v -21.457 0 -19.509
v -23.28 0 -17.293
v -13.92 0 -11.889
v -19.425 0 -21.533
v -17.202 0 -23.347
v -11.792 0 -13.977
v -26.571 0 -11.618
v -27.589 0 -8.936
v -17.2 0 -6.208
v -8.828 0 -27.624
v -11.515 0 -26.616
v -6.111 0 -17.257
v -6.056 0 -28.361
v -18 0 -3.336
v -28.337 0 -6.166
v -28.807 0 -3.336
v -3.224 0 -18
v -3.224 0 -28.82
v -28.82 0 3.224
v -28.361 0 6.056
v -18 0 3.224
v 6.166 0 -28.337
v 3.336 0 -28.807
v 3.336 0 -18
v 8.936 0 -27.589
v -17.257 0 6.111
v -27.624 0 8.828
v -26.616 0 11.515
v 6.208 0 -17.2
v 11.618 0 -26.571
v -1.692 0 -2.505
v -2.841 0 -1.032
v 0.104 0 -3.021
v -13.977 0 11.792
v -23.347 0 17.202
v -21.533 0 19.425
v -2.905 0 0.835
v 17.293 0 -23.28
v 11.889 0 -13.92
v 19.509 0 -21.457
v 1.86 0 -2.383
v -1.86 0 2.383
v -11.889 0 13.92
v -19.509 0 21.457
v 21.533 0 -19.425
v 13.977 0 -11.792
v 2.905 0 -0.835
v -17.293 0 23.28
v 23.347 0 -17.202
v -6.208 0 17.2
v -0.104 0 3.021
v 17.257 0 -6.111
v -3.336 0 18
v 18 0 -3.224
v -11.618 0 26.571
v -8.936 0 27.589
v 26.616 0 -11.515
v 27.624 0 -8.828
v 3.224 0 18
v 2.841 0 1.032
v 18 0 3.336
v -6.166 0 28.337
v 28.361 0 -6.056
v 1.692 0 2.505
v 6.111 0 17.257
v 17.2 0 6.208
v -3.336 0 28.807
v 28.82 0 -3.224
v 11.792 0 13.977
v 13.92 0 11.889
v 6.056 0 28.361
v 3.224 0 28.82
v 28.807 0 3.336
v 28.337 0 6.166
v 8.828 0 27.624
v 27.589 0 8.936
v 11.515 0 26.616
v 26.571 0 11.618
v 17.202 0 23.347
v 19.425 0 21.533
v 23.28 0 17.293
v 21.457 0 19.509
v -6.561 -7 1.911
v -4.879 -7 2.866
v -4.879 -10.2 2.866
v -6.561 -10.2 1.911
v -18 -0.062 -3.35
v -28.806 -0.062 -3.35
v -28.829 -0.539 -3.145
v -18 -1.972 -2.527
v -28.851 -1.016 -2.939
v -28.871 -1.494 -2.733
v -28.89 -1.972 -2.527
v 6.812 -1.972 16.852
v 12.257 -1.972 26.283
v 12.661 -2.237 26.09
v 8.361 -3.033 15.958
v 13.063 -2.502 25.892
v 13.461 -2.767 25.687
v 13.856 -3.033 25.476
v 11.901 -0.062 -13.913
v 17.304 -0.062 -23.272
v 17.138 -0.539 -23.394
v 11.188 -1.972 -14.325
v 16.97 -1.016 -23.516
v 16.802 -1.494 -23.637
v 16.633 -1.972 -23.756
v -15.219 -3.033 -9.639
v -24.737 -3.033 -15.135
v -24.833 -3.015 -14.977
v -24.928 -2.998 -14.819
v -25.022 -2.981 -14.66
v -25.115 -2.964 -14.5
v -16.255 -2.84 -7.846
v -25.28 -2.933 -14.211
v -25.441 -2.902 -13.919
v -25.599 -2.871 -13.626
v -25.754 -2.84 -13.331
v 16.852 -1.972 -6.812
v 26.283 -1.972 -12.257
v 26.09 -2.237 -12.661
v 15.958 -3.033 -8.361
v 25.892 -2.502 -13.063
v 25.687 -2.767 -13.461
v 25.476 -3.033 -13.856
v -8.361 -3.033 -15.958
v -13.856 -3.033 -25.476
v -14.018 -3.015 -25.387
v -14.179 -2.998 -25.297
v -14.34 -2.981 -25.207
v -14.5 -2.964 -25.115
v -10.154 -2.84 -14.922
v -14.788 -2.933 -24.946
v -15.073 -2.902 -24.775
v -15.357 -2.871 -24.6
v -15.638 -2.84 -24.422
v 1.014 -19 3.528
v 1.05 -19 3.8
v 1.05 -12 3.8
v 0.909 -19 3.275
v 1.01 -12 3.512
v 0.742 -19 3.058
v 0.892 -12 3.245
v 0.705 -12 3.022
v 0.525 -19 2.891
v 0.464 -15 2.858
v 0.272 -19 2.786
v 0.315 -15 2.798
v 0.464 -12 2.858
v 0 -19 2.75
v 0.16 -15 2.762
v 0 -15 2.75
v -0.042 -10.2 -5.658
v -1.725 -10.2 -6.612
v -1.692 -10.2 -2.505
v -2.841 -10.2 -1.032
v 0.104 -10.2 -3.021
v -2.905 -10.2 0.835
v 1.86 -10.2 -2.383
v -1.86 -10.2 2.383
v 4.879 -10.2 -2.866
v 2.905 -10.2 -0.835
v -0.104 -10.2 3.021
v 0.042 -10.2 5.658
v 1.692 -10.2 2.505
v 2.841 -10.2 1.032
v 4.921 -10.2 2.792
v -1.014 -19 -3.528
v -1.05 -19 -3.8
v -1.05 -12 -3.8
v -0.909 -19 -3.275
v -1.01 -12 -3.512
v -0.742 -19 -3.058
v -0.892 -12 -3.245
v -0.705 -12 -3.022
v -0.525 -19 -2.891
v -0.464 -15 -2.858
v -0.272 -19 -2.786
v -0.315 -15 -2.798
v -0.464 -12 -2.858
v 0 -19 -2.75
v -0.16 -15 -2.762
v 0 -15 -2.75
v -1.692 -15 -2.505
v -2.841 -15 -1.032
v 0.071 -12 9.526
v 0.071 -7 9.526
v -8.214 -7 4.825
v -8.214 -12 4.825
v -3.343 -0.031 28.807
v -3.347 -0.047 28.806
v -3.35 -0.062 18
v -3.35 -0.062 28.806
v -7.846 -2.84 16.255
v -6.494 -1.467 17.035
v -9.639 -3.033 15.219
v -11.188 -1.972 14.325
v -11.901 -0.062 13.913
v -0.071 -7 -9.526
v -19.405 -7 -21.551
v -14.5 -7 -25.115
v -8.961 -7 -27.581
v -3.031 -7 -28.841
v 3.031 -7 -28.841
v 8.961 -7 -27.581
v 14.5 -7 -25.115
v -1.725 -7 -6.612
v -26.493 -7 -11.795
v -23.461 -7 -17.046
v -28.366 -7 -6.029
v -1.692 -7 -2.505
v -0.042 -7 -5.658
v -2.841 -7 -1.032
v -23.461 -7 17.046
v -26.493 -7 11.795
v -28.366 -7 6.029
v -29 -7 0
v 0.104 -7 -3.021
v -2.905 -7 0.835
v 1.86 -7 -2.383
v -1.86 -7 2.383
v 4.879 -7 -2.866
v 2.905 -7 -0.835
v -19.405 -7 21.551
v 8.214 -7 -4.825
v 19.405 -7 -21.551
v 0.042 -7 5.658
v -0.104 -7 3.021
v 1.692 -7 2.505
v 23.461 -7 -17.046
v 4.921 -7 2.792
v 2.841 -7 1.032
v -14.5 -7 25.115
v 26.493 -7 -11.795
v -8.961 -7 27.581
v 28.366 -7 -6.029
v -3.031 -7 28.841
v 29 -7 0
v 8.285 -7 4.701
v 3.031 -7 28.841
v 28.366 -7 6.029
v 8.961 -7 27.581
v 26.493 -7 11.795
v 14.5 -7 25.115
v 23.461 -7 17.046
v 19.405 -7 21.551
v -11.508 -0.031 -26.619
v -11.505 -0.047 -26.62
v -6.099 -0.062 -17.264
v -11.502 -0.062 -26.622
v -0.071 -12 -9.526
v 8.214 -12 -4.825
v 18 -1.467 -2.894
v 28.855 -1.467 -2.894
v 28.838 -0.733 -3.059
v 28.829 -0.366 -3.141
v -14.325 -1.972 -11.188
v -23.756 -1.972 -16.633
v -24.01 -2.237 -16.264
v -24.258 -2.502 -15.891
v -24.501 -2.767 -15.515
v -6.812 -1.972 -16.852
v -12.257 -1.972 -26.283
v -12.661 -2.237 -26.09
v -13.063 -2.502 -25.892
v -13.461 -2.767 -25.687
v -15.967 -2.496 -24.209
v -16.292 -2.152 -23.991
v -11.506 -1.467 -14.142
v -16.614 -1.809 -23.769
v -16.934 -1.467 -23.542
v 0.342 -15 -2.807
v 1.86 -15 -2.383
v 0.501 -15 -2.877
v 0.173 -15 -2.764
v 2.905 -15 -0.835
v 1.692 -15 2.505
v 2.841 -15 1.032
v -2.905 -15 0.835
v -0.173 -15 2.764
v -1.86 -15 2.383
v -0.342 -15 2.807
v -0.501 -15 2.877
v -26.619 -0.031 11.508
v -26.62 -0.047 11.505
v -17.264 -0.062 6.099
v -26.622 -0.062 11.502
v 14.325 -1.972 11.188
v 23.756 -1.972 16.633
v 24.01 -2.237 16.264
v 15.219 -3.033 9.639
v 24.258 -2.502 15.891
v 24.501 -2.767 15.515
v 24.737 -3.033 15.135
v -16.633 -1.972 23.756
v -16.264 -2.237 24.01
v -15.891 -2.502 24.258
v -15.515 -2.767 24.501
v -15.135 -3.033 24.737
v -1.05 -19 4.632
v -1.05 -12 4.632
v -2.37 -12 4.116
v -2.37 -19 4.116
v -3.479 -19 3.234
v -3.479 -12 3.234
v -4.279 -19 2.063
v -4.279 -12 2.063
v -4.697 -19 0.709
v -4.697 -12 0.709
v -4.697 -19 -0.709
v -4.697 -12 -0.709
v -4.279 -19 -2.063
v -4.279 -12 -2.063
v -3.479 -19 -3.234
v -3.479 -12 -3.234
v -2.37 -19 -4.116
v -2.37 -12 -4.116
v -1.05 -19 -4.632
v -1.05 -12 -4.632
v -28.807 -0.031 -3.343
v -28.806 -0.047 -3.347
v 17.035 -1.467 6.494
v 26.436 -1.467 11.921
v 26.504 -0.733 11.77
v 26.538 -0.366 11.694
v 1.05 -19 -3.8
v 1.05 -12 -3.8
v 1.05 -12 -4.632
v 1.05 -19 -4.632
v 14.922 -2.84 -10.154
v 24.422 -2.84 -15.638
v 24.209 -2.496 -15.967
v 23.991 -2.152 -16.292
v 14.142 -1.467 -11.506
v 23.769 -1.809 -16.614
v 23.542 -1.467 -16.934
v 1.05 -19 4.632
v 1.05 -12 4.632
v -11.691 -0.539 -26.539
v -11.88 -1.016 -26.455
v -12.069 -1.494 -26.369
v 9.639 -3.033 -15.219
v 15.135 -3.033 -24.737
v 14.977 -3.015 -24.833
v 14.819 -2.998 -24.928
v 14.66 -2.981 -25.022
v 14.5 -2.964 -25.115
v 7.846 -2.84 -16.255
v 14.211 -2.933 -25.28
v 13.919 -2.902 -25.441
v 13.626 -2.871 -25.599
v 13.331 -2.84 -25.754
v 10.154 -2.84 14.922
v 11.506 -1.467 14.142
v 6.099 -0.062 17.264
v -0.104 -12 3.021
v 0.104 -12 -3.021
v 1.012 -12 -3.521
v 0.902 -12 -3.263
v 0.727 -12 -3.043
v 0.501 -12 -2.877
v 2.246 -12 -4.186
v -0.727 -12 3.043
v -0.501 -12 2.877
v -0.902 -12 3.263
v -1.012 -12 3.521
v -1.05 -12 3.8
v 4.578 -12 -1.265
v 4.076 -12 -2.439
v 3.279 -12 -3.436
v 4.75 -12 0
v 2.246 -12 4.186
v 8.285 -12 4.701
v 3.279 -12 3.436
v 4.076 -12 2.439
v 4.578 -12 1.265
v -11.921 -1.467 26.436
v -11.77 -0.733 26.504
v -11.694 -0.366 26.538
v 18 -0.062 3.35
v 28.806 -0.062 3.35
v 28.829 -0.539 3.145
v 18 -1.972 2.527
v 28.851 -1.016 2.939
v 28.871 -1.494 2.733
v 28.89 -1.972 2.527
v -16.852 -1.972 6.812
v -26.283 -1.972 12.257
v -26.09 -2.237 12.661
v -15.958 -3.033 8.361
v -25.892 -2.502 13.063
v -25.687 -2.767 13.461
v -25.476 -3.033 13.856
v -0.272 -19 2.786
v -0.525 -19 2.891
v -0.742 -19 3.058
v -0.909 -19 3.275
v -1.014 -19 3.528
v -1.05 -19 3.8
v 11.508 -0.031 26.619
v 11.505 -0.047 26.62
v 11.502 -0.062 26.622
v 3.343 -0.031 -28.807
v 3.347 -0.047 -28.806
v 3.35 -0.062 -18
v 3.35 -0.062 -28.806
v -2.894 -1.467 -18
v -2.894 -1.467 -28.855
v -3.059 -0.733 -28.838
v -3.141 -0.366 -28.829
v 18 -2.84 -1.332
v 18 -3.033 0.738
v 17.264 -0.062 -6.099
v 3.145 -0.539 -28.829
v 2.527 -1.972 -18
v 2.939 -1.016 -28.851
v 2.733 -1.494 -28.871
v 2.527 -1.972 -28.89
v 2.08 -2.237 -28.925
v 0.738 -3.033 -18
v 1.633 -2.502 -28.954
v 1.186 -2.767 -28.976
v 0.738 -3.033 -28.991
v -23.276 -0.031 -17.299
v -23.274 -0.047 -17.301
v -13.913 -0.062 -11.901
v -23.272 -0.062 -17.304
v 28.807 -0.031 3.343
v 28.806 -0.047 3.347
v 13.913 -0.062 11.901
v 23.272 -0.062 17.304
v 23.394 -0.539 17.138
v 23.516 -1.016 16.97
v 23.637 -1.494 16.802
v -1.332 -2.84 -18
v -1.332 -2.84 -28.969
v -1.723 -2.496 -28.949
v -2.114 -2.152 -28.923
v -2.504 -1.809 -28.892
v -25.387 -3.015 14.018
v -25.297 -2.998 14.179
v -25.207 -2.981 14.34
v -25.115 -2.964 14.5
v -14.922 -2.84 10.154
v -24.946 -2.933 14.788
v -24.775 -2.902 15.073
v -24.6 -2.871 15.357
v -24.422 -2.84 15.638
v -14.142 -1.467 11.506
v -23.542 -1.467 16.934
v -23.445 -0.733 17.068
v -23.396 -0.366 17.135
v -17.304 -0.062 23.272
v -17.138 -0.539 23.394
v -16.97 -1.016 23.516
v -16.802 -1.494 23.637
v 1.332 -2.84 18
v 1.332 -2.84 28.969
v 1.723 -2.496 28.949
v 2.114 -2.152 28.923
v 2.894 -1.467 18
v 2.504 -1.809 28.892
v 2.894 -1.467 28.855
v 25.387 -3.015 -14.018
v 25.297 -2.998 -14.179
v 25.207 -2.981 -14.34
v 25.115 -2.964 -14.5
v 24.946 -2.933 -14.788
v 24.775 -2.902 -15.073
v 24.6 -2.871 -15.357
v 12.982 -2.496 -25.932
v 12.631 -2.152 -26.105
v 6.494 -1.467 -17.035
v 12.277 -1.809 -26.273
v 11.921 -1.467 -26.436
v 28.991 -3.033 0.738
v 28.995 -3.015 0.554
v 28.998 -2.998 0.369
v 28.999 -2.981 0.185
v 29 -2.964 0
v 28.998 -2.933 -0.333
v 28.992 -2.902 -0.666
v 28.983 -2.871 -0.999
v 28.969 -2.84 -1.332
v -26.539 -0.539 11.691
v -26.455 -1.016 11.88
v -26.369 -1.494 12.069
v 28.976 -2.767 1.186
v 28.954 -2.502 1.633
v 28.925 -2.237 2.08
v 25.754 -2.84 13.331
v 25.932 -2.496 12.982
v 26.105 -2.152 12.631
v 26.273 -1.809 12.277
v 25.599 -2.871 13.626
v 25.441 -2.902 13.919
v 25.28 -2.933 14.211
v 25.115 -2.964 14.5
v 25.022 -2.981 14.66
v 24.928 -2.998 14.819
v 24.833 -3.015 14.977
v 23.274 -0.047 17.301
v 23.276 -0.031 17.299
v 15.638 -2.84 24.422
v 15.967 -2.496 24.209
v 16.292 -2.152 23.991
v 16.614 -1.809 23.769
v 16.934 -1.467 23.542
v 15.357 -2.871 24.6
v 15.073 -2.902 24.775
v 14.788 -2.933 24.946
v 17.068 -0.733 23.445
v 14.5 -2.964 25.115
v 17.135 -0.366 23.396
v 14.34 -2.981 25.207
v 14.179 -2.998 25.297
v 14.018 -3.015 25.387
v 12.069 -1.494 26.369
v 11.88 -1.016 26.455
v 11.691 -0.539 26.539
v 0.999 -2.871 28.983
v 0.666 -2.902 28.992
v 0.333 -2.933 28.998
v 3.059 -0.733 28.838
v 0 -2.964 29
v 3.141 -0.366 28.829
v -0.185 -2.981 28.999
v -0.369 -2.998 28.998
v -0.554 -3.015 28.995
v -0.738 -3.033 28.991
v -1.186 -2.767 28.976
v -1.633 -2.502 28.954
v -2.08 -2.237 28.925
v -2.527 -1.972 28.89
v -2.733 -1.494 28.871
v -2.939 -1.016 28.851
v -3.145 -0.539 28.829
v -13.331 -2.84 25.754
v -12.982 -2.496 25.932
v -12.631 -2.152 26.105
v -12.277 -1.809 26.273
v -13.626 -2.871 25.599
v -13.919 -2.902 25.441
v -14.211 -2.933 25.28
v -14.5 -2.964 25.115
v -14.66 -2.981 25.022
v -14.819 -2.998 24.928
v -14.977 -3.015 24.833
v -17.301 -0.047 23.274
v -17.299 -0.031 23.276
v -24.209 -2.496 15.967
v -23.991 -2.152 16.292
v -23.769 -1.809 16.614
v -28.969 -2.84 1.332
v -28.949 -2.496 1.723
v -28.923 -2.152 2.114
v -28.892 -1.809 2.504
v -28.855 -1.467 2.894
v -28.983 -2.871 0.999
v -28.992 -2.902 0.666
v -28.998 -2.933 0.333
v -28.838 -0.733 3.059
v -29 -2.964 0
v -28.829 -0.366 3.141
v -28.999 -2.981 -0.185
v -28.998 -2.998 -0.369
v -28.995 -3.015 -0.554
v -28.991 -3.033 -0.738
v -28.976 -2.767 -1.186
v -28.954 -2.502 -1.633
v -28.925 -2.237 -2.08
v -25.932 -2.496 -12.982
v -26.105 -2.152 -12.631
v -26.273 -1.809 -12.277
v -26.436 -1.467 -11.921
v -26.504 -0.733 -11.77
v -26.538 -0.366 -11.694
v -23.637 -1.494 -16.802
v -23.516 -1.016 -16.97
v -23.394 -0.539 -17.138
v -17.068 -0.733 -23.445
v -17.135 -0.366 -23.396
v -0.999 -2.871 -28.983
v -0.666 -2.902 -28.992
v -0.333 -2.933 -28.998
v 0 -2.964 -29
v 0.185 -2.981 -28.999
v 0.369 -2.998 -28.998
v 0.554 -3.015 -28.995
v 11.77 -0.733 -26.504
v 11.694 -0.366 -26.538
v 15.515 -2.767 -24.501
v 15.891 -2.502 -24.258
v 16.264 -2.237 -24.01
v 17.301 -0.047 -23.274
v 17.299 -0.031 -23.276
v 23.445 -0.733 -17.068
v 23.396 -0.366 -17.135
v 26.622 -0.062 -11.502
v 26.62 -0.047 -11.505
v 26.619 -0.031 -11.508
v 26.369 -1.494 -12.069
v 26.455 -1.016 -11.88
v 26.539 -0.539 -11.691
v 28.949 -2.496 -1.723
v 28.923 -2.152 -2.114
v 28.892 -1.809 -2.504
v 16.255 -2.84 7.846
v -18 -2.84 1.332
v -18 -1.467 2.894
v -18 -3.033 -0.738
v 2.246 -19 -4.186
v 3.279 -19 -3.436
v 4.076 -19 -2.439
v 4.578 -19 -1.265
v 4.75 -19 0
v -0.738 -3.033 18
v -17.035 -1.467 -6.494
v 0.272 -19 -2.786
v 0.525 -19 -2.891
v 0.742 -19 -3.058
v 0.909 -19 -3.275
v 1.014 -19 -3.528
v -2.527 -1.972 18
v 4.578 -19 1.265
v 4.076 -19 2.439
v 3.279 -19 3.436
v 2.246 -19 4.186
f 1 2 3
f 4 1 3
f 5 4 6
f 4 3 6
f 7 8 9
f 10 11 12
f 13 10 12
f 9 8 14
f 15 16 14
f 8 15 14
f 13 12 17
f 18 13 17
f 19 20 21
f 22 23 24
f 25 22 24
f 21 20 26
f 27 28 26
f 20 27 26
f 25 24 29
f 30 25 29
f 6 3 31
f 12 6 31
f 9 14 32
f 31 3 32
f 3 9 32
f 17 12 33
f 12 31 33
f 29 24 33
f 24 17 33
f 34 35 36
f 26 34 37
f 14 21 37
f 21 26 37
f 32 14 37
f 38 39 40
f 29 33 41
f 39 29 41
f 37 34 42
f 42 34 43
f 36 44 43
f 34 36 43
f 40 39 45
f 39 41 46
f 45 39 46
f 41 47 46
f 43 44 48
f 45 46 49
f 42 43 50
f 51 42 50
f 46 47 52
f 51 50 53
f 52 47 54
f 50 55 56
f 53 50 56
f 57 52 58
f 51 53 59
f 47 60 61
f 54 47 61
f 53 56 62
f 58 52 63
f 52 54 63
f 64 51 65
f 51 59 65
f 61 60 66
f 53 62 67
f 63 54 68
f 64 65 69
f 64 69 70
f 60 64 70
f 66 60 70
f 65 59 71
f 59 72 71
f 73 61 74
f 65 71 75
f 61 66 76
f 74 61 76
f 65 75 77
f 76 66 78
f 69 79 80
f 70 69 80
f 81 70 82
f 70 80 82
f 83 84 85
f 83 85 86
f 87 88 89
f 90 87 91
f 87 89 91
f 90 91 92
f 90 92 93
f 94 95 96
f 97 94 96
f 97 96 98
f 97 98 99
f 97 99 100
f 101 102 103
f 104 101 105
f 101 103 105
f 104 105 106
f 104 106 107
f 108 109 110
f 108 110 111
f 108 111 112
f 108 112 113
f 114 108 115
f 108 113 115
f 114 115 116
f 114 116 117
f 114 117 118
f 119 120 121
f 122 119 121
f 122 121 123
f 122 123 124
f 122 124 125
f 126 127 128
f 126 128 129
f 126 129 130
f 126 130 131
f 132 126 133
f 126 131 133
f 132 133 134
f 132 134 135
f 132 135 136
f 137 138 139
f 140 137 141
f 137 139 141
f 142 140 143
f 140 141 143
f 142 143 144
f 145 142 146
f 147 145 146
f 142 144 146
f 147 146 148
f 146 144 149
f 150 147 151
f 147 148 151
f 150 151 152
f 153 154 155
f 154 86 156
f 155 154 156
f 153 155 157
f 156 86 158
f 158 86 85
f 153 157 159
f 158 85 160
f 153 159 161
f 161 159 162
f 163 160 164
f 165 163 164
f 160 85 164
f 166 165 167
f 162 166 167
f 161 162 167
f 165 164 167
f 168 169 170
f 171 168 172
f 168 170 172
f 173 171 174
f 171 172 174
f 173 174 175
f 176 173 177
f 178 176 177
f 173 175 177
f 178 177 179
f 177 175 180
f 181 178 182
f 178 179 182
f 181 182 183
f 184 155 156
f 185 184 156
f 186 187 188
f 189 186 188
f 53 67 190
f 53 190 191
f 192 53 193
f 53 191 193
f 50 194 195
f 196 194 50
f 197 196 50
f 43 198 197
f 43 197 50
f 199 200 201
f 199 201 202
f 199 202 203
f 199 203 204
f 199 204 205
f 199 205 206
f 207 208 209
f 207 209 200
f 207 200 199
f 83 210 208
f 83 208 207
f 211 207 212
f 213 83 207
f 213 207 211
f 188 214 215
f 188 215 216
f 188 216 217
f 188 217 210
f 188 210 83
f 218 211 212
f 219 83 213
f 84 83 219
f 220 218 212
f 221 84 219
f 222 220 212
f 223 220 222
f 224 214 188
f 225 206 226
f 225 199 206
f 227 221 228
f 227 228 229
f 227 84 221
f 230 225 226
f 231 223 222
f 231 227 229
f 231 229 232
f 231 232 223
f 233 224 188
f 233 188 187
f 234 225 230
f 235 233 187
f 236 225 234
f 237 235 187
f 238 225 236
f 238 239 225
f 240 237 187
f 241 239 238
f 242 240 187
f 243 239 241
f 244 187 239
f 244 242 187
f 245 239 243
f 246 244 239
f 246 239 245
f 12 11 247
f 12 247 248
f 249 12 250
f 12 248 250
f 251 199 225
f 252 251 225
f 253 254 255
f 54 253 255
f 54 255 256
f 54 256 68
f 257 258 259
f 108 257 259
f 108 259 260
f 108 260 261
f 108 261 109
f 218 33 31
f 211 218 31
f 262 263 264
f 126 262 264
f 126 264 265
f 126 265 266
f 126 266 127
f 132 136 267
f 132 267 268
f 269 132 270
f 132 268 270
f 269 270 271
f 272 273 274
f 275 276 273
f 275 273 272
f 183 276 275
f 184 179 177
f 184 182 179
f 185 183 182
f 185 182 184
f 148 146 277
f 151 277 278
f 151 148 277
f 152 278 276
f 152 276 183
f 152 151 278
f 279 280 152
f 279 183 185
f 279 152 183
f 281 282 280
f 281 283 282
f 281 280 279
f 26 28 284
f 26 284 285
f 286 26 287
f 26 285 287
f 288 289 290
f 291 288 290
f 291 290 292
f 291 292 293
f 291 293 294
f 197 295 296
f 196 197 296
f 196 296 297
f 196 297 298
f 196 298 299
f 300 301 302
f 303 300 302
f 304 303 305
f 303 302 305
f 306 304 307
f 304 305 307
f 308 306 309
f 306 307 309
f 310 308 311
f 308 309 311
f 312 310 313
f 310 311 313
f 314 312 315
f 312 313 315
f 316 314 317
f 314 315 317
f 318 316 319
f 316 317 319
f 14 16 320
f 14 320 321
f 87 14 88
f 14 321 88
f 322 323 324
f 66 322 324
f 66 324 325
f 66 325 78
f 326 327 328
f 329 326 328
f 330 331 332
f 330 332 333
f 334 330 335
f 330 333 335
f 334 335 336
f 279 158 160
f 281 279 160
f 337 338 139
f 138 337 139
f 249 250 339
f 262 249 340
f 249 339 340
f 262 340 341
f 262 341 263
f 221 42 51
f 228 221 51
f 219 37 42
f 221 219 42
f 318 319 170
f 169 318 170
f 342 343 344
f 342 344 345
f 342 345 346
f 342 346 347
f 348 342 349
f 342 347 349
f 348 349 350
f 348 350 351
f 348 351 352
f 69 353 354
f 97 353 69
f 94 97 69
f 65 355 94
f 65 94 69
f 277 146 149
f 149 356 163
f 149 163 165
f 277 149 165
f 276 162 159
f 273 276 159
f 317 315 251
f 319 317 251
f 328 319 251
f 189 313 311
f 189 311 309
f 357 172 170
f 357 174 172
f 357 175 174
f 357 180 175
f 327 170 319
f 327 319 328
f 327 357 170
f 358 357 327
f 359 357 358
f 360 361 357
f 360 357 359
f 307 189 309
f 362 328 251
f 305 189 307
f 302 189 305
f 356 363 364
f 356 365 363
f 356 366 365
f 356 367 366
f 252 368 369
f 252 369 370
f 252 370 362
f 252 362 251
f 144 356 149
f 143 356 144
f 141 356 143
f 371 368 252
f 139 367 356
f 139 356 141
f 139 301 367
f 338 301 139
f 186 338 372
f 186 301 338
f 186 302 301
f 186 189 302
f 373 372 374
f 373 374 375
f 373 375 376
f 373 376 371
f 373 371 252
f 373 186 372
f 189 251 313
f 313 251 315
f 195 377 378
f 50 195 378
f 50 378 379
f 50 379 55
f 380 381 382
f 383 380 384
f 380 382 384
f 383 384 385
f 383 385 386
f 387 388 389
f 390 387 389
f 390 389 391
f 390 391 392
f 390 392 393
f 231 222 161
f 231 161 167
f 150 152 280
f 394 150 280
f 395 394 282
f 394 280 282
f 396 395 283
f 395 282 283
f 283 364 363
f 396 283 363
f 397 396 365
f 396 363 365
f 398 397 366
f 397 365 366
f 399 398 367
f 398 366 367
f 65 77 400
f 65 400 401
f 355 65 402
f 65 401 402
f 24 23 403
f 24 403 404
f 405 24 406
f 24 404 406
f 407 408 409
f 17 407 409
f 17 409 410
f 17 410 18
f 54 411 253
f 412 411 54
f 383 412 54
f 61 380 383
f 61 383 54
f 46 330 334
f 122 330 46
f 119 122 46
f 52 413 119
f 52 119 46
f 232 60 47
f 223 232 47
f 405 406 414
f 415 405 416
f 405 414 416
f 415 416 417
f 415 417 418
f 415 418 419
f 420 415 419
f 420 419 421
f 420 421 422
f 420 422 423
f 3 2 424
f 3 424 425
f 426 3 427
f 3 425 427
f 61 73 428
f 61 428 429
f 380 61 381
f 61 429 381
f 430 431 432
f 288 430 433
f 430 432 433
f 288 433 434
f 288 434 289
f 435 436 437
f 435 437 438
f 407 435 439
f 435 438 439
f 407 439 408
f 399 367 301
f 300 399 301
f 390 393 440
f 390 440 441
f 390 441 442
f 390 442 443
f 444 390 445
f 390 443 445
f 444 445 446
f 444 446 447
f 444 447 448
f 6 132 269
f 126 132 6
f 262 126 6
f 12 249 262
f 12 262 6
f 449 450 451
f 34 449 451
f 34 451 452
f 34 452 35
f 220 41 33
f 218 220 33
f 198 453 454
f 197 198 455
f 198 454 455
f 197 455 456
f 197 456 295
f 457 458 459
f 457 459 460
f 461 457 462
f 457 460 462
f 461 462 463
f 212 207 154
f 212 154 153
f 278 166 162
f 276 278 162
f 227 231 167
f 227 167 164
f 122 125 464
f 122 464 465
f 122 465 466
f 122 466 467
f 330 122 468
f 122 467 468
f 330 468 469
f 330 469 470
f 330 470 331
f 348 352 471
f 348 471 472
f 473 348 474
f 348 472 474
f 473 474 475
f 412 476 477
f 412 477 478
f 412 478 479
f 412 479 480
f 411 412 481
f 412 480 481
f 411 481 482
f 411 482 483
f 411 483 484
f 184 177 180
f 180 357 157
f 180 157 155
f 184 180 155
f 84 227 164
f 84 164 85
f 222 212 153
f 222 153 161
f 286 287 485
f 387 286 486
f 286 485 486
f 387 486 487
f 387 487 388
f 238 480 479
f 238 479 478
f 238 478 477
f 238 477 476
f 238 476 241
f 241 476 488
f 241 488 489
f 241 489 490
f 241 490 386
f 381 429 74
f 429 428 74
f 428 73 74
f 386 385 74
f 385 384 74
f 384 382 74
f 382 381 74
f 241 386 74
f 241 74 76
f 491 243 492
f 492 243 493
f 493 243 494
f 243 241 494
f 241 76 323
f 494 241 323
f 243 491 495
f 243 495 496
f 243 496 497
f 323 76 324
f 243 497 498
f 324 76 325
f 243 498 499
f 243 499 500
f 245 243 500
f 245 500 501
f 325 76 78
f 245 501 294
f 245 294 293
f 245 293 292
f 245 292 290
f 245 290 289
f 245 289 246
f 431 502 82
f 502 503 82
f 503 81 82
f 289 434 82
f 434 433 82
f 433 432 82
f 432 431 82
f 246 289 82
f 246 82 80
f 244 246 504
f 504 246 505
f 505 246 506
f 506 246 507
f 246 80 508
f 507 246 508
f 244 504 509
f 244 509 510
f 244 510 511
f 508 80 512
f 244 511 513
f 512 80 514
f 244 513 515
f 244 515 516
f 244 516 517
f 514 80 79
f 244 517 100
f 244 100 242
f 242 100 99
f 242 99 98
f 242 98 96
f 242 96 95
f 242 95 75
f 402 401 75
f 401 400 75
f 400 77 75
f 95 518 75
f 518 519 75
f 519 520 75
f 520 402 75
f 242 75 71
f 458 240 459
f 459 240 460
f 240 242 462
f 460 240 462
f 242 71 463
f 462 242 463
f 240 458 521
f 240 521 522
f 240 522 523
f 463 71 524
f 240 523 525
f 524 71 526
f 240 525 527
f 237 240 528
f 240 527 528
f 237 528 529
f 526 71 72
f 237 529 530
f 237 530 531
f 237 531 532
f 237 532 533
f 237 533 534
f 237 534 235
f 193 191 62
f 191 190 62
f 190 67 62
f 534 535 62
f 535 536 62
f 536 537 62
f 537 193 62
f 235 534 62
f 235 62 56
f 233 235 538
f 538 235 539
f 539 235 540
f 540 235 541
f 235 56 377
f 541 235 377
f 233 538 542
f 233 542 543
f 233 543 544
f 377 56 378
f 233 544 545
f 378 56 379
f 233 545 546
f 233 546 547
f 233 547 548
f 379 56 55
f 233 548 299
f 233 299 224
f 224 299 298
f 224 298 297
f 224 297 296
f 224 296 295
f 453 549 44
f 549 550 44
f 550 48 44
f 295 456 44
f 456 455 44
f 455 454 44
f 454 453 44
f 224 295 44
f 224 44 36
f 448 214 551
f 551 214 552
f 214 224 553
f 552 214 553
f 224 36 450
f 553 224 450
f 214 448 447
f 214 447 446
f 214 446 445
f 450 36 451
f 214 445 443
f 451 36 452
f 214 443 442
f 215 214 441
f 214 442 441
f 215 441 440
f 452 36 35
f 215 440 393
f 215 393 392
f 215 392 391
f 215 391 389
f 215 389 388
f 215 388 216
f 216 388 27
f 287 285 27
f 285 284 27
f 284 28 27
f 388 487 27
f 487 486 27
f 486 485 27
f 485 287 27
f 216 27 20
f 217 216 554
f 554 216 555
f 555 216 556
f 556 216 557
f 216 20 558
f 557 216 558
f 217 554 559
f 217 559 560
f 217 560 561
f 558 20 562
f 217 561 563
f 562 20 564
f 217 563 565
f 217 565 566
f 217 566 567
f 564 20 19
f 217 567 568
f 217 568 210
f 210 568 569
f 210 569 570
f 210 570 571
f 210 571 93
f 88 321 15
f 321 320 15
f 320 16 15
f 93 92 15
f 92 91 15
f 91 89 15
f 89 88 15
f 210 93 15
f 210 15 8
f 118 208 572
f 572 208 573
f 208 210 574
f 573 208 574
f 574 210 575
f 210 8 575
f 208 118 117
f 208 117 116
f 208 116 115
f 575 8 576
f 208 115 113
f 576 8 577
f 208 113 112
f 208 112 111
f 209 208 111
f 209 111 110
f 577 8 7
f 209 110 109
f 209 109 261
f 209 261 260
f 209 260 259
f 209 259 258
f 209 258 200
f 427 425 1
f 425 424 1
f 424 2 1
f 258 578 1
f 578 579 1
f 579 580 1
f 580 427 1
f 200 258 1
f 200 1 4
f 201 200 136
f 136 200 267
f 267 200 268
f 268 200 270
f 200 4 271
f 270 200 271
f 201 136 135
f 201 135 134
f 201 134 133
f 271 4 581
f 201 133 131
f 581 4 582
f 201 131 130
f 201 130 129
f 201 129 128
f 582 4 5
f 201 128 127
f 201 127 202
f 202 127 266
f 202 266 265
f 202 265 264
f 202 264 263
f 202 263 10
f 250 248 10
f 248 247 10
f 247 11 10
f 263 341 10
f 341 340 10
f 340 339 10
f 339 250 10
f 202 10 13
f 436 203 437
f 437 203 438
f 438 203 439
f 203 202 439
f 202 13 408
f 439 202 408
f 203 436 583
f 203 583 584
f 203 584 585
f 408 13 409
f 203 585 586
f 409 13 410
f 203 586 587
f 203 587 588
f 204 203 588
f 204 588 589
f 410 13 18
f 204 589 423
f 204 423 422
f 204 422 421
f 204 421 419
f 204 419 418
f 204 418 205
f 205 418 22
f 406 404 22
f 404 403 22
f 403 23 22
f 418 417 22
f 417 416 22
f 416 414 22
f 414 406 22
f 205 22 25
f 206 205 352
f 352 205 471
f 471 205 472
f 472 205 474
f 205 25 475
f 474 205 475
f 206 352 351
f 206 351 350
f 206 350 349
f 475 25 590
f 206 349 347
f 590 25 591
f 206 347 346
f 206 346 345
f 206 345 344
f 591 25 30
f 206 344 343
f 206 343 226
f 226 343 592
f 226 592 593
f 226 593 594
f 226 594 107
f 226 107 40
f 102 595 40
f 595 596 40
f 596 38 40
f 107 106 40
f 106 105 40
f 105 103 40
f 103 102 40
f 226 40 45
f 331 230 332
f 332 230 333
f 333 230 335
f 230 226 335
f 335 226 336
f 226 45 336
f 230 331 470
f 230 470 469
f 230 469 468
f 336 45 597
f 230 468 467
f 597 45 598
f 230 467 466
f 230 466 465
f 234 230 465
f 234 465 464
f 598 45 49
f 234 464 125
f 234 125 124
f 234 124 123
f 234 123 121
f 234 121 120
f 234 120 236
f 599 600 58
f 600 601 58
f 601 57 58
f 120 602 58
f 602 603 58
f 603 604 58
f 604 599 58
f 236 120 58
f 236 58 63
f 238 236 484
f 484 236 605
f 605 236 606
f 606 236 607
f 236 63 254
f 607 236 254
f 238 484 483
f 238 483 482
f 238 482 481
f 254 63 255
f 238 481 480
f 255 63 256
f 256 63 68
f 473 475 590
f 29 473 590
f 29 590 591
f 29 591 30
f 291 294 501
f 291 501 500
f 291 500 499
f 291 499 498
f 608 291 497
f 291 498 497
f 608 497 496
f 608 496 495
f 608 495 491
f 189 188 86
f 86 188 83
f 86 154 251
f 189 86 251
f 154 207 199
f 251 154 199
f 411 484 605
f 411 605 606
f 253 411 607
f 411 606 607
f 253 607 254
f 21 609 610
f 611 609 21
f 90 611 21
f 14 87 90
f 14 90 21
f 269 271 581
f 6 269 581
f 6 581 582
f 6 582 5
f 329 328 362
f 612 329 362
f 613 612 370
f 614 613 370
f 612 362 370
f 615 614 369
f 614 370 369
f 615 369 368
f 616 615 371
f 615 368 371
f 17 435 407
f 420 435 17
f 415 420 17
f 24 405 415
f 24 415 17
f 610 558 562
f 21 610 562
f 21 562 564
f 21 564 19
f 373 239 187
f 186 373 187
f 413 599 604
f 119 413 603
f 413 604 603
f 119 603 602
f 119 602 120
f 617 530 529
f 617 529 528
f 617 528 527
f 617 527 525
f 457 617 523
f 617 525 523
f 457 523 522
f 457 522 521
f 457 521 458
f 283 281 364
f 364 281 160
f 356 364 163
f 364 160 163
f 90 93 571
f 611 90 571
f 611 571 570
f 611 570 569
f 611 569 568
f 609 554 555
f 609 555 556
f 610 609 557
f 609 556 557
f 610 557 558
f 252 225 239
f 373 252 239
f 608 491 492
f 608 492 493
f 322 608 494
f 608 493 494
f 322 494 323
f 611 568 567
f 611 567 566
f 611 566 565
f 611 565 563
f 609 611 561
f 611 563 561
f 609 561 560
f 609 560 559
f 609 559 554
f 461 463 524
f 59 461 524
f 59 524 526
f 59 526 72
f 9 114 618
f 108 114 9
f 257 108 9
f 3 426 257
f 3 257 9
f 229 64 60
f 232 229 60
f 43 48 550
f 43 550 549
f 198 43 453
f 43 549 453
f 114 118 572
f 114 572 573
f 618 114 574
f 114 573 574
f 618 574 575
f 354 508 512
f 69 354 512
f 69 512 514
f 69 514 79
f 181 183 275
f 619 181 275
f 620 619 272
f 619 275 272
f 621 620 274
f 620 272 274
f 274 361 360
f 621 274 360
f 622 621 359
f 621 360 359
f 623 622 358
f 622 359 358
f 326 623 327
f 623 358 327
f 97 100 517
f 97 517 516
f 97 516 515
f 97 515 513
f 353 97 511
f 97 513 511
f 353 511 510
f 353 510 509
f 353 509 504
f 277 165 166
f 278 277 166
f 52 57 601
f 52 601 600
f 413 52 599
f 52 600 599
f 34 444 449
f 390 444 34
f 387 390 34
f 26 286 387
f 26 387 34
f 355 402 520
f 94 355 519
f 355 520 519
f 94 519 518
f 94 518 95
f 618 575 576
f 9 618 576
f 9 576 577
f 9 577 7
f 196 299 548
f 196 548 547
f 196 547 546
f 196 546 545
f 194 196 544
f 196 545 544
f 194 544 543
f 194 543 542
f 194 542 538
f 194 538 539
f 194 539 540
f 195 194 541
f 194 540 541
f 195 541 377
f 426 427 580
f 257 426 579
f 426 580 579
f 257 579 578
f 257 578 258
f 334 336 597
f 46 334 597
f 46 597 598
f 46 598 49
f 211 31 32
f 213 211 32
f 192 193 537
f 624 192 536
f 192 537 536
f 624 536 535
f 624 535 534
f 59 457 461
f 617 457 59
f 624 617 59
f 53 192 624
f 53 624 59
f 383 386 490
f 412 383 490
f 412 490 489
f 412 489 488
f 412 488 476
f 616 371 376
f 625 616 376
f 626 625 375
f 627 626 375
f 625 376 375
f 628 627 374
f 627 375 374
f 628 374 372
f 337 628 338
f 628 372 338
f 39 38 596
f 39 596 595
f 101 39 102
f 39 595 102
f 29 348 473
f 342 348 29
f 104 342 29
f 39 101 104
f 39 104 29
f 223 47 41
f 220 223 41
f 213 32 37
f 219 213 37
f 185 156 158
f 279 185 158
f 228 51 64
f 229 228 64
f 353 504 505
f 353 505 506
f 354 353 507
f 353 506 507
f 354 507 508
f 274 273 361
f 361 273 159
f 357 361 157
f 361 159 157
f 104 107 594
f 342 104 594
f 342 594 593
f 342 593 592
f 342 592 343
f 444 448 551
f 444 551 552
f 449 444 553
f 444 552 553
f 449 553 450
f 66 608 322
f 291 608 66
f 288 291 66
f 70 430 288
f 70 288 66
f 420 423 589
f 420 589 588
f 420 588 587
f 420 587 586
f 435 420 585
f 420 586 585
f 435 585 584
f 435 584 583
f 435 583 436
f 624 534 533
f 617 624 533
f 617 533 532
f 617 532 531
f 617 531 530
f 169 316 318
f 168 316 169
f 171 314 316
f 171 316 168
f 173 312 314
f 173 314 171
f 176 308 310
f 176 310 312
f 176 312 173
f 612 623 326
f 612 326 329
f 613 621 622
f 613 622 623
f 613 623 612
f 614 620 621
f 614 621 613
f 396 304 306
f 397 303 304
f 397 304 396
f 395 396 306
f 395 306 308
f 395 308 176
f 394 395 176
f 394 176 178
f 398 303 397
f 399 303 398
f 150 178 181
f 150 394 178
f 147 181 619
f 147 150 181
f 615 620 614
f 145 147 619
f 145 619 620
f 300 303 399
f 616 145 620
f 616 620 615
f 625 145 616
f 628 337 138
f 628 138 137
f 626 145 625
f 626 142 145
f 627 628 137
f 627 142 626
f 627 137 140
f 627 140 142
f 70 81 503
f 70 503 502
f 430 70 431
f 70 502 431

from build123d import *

# Parameters (mm, degrees)
F0_R            = 29
F1_DEPTH        = 7
F3_DEPTH        = 12
F6_DEPTH        = 11
F6_COPIES_COUNT = 12
F9_DEPTH        = 5
F11_DEPTH       = 3.2
F13_DEPTH       = 15


# Not quite as in the source:
# - a pattern or mirror of a feature is missing from the dataset's text; its kind, count and spacing are read off the source's solid


with BuildPart() as f1:
    # F0 (on Front) → F1 (new body)
    with BuildSketch(Plane.XZ):
        Circle(F0_R)
    extrude(amount=F1_DEPTH)

    # F2 (on face) → F3 (join)
    with BuildSketch(Plane.XZ.offset(7)):
        with BuildLine():
            Line((0, -2.75), (0, 2.75))
            ThreePointArc((0, 2.75), (-0.7424621202, 3.0575378798), (-1.05, 3.8))
            Line((-1.05, 3.8), (-1.05, 4.6324939288))
            ThreePointArc((-1.05, 4.6324939288), (-4.75, 0), (-1.05, -4.6324939288))
            Line((-1.05, -4.6324939288), (-1.05, -3.8))
            ThreePointArc((-1.05, -3.8), (-0.7424621202, -3.0575378798), (0, -2.75))
        make_face()
        with BuildLine():
            ThreePointArc((1.05, -4.6324939288), (3.711468712, -2.9643717716), (4.75, 0))
            ThreePointArc((4.75, 0), (3.711468712, 2.9643717716), (1.05, 4.6324939288))
            Line((1.05, 4.6324939288), (1.05, 3.8))
            ThreePointArc((1.05, 3.8), (0.7424621202, 3.0575378798), (0, 2.75))
            Line((0, 2.75), (0, -2.75))
            ThreePointArc((0, -2.75), (0.7424621202, -3.0575378798), (1.05, -3.8))
            Line((1.05, -3.8), (1.05, -4.6324939288))
        make_face()
    extrude(amount=F3_DEPTH)

    # F5 (on offset) → F6 (cut)
    with BuildSketch(Plane.YZ.offset(29)):
        Polygon((-2.8396848584, -1.3322586236), (-1.4665255865, -2.8938910614), (0.5622881169, -3.3501554734), (2.4718183739, -2.5267743623), (3.5326895289, -0.7382513266), (3.3396848584, 1.3322586236), (1.9665255865, 2.8938910614), (-0.0622881169, 3.3501554734), (-1.9718183739, 2.5267743623), (-3.0326895289, 0.7382513266), align=None)
    f6 = extrude(amount=-F6_DEPTH, mode=Mode.SUBTRACT)

    # F6_copies: F6 ×12 about axis
    f6_copies_axis = Axis((0, 0, 0), (0, 1, 0))
    for i in range(1, F6_COPIES_COUNT):
        add(f6.rotate(f6_copies_axis, i * 360 / F6_COPIES_COUNT), mode=Mode.SUBTRACT)

    # F8 (on face) → F9 (join)
    with BuildSketch(Plane.XZ.offset(7)):
        Polygon((8.2854374709, 4.7012260014), (0.0713375892, 9.5260123319), (-8.2140998816, 4.8247863305), (-0.0713375892, -9.5260123319), (8.2140998816, -4.8247863305), align=None)
        with BuildLine():
            ThreePointArc((-1.05, -4.6324939288), (-4.75, 0), (-1.05, 4.6324939288))
            Line((-1.05, 4.6324939288), (-1.05, 3.8))
            ThreePointArc((-1.05, 3.8), (0, 2.75), (1.05, 3.8))
            Line((1.05, 3.8), (1.05, 4.6324939288))
            ThreePointArc((1.05, 4.6324939288), (4.75, 0), (1.05, -4.6324939288))
            Line((1.05, -4.6324939288), (1.05, -3.8))
            ThreePointArc((1.05, -3.8), (0, -2.75), (-1.05, -3.8))
            Line((-1.05, -3.8), (-1.05, -4.6324939288))
        make_face(mode=Mode.SUBTRACT)
        with BuildLine():
            Line((-1.05, 3.8), (-1.05, 4.6324939288))
            ThreePointArc((-1.05, 4.6324939288), (-4.75, 0), (-1.05, -4.6324939288))
            Line((-1.05, -4.6324939288), (-1.05, -3.8))
            ThreePointArc((-1.05, -3.8), (0, -2.75), (1.05, -3.8))
            Line((1.05, -3.8), (1.05, -4.6324939288))
            ThreePointArc((1.05, -4.6324939288), (4.75, 0), (1.05, 4.6324939288))
            Line((1.05, 4.6324939288), (1.05, 3.8))
            ThreePointArc((1.05, 3.8), (0, 2.75), (-1.05, 3.8))
        make_face()
    extrude(amount=F9_DEPTH)

    # F10 (on face) → F11 (cut)
    with BuildSketch(Plane.XZ.offset(7)):
        Polygon((4.92104771, 2.7922433221), (0.0423702045, 5.6578739911), (-4.8786775054, 2.865630669), (-4.92104771, -2.7922433221), (-0.0423702045, -5.6578739911), (4.8786775054, -2.865630669), align=None)
        Polygon((-4.92104771, -2.7922433221), (-4.8786775054, 2.865630669), (-9.9290630252, 0), (-5.0927557243, -8.5235046601), (-0.0423702045, -5.6578739911), align=None)
    extrude(amount=F11_DEPTH, mode=Mode.SUBTRACT)

    # F12 (on face) → F13 (cut)
    with BuildSketch(Plane(origin=(0, 0, 0), x_dir=(-1, 0, 0), z_dir=(0, 1, 0))):
        Polygon((2.9053820181, 0.8348685994), (1.8597799775, 2.3831635875), (0.103805197, 3.0211710859), (-1.6918196405, 2.5051939154), (-2.8412268781, 1.0323178175), (-2.9053820181, -0.8348685994), (-1.8597799775, -2.3831635875), (-0.103805197, -3.0211710859), (1.6918196405, -2.5051939154), (2.8412268781, -1.0323178175), align=None)
    extrude(amount=-F13_DEPTH, mode=Mode.SUBTRACT)


solid = f1.part
